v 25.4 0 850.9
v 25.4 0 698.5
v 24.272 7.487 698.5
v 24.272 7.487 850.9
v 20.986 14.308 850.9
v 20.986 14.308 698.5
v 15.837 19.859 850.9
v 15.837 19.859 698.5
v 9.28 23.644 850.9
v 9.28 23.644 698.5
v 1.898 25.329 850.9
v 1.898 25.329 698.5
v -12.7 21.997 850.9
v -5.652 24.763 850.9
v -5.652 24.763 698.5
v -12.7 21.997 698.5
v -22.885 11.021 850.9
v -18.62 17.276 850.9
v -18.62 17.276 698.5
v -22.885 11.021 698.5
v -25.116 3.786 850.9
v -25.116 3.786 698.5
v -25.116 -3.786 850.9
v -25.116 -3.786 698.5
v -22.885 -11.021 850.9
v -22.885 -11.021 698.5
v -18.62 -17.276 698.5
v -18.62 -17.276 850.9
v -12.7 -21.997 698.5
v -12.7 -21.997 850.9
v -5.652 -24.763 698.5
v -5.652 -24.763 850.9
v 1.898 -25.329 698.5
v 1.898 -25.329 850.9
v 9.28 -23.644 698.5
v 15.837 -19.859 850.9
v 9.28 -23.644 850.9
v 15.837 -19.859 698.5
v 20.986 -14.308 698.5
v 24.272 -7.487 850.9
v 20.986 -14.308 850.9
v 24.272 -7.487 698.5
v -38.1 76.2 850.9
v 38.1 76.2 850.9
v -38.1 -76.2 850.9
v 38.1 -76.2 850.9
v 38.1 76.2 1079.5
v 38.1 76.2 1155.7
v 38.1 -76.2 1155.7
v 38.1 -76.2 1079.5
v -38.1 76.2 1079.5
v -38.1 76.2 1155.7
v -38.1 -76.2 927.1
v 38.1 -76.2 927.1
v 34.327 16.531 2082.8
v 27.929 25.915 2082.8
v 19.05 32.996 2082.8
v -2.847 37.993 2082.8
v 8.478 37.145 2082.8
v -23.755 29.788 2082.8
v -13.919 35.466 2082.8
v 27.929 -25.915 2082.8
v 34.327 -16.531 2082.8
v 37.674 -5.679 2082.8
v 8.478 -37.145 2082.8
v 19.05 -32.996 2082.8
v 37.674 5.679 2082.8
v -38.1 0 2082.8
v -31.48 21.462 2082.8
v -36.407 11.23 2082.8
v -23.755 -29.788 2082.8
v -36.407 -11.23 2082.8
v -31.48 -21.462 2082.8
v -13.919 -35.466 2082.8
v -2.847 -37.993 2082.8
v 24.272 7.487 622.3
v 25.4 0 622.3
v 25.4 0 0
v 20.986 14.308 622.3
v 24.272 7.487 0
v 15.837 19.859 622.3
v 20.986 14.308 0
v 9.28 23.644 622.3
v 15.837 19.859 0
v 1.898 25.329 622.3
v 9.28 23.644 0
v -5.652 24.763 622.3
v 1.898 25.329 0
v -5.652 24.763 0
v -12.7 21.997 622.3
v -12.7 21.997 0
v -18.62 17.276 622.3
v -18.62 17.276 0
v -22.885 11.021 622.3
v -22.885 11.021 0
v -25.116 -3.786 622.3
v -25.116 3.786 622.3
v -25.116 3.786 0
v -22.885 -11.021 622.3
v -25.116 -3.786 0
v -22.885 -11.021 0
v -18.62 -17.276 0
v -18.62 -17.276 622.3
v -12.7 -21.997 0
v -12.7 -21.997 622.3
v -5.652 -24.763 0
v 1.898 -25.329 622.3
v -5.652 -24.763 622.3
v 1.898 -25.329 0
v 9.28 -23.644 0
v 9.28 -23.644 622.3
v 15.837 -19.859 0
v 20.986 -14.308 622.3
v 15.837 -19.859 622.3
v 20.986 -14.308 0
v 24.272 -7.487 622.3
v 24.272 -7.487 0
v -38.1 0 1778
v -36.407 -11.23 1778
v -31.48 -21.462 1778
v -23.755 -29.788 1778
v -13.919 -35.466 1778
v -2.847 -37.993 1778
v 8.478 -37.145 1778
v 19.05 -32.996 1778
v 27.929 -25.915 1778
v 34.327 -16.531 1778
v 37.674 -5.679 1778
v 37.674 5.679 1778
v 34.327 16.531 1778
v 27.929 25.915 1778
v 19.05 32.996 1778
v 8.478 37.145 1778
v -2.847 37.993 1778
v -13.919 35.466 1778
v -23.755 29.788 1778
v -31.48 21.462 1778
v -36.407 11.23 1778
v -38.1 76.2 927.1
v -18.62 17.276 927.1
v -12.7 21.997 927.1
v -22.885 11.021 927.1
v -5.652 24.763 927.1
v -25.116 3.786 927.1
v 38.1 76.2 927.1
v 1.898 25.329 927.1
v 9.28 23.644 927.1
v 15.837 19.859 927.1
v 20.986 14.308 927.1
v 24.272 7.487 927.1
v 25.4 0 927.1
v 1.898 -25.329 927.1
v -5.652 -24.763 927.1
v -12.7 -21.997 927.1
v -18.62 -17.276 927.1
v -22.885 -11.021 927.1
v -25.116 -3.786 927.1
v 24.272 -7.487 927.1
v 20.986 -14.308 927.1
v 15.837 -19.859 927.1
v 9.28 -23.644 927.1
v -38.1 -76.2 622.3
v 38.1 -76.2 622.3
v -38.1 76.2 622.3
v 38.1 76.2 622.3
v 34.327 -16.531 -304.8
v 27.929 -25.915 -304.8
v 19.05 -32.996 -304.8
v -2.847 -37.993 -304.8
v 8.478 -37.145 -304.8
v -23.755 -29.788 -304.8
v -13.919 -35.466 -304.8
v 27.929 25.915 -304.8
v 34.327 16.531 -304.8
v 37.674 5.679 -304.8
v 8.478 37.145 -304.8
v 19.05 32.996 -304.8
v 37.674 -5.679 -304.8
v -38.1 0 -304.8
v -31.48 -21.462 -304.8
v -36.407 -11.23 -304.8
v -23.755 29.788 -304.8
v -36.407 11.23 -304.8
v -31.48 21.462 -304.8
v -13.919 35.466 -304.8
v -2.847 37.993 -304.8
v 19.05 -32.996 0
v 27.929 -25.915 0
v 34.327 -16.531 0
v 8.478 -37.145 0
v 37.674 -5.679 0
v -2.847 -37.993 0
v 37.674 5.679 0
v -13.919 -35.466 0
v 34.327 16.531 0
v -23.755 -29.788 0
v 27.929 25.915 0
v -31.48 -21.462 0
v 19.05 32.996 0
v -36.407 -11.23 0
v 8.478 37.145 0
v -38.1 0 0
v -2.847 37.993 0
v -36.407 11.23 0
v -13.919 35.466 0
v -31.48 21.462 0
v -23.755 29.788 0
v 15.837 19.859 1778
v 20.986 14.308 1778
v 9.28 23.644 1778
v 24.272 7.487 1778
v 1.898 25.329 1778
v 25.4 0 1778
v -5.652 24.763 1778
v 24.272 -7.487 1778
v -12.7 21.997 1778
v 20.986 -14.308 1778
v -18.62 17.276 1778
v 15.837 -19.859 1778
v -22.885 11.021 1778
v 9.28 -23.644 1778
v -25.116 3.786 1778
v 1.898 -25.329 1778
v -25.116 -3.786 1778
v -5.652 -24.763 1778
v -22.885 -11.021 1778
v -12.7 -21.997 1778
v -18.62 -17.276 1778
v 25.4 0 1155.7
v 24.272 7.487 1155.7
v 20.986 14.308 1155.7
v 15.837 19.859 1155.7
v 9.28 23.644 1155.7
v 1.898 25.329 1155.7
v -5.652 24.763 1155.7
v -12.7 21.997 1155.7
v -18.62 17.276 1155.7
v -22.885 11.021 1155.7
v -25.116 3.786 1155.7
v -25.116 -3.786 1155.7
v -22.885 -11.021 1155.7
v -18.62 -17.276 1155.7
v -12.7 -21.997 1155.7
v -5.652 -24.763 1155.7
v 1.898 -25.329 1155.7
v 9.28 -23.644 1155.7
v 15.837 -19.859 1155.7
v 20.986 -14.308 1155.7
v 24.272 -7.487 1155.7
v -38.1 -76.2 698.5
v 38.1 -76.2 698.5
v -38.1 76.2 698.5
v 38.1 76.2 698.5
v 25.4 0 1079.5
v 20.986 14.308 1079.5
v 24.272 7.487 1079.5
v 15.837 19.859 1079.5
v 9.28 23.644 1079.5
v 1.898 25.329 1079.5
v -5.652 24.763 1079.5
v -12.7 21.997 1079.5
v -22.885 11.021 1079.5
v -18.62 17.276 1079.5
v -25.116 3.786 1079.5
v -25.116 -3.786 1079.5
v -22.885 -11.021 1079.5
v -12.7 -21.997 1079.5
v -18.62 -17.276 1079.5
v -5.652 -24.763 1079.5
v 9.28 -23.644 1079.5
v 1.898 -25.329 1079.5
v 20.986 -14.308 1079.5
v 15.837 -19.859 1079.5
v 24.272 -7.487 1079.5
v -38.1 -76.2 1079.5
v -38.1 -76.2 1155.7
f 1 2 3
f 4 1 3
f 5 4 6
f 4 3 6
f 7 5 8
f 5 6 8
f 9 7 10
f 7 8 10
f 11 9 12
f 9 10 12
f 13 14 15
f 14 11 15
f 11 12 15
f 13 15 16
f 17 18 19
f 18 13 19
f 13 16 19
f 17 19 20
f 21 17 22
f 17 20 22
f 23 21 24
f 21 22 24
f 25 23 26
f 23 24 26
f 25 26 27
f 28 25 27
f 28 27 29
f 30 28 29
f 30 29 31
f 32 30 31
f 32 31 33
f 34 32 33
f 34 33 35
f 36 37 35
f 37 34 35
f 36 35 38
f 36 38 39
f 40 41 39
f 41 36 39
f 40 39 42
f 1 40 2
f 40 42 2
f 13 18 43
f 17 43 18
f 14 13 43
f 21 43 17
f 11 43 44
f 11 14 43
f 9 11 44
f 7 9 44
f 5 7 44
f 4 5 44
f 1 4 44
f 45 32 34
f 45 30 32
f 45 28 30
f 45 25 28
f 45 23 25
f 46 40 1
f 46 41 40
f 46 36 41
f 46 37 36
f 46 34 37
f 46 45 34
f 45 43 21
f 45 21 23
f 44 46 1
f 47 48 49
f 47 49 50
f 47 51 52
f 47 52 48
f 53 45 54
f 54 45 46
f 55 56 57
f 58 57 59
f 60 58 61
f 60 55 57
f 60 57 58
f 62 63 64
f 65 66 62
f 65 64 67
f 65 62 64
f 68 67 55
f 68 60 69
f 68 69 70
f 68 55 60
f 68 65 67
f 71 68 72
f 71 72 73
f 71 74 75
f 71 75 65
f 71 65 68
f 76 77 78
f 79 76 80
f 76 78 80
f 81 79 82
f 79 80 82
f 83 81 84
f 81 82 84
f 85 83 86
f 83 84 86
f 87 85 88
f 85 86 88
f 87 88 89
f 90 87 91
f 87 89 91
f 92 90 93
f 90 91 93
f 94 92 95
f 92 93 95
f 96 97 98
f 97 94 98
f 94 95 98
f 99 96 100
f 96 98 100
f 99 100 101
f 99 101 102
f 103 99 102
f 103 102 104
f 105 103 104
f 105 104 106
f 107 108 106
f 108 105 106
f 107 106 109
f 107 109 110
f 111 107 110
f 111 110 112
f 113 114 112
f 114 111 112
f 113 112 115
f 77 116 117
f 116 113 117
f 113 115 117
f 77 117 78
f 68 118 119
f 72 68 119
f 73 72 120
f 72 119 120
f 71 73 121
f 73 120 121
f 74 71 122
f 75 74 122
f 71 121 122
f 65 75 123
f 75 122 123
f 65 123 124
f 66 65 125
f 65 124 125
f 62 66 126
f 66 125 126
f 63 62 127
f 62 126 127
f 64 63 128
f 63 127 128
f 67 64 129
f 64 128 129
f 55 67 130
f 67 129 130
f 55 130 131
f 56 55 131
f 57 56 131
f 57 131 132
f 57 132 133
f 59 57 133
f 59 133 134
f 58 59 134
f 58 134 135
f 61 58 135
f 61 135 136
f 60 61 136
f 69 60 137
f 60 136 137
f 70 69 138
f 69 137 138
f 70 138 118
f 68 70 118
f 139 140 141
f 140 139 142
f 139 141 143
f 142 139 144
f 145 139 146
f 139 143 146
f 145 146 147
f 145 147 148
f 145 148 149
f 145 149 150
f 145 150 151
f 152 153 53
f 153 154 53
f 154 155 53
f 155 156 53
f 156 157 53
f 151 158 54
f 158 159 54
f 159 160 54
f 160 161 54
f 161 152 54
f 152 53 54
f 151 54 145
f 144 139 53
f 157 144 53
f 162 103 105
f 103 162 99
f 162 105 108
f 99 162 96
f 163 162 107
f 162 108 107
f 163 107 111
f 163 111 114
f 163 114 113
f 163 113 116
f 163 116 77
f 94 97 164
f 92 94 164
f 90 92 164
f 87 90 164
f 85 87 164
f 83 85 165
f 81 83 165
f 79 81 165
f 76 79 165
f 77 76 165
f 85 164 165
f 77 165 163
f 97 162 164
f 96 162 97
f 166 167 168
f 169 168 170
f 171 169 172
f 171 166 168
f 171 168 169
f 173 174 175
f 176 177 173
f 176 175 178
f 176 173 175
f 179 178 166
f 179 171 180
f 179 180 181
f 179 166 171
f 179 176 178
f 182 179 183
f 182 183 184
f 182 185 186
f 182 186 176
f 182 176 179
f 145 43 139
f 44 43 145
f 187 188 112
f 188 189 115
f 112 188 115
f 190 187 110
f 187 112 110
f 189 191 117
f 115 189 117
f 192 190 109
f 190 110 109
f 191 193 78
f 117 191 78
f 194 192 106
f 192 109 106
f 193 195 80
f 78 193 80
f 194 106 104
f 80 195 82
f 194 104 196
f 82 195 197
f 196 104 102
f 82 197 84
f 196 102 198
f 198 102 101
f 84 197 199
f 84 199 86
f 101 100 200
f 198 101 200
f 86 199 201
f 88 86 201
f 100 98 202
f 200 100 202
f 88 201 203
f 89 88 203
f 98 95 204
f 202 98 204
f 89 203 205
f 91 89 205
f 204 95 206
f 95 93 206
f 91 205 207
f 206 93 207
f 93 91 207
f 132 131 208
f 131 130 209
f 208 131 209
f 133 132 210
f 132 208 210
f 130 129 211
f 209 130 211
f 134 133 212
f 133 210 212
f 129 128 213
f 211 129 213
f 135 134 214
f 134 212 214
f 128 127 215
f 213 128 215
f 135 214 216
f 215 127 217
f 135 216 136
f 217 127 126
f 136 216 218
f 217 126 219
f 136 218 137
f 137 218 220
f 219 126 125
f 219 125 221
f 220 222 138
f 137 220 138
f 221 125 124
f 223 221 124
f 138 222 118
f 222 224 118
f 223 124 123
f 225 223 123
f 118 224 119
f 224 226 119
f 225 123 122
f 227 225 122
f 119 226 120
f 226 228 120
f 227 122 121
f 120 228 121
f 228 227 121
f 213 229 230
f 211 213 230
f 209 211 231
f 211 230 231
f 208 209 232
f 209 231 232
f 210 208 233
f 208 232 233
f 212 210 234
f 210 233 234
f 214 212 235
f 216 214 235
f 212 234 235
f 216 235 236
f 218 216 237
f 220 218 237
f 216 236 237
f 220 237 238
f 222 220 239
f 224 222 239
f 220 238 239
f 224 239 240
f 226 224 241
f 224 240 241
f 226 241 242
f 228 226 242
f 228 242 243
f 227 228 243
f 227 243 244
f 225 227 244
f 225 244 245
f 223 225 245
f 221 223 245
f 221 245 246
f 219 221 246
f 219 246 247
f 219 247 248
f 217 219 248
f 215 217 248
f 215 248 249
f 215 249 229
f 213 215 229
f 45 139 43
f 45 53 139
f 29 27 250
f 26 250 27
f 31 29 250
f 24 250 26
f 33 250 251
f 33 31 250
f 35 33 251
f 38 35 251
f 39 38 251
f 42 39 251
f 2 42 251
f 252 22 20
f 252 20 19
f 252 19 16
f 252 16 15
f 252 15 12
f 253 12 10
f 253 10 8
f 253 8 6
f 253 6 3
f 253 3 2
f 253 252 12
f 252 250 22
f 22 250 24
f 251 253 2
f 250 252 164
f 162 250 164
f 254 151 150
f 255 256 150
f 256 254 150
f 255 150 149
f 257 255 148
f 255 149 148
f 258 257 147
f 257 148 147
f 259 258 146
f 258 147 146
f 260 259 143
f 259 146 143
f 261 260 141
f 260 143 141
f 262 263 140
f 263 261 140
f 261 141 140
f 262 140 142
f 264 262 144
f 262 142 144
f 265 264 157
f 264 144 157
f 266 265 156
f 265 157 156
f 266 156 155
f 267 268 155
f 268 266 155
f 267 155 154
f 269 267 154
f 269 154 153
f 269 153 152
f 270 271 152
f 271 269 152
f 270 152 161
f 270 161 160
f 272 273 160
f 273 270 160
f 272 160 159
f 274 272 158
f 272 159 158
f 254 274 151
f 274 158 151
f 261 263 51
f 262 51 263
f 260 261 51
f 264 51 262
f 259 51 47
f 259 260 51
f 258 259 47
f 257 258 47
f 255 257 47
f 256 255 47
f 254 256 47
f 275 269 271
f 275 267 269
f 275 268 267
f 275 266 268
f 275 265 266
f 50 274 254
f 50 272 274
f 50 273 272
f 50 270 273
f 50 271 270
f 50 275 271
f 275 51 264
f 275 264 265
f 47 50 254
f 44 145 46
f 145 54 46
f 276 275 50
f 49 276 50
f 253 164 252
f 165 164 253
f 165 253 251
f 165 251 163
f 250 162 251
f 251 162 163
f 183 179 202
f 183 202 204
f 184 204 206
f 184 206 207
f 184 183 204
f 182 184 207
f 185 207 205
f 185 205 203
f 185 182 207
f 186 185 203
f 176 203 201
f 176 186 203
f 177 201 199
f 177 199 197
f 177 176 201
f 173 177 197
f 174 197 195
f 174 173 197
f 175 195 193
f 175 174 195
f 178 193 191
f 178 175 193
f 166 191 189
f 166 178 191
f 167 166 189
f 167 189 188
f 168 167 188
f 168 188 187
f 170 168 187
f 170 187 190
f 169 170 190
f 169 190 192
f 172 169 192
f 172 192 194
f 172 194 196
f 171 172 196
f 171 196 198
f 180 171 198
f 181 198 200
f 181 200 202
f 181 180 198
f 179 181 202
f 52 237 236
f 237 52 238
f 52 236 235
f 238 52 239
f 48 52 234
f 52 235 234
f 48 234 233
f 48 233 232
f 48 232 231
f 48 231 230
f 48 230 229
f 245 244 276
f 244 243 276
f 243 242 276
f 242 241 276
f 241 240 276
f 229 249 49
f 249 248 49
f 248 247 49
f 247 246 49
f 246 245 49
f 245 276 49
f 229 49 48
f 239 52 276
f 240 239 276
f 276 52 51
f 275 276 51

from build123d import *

# Parameters (mm, degrees)
SKETCH1_R           = 25.4
BOSS_EXTRUDE1_DEPTH = 1778
SKETCH2_R           = 38.1
BOSS_EXTRUDE2_DEPTH = 304.8
BOSS_EXTRUDE3_START = 304.8
SKETCH3_R           = 38.1
BOSS_EXTRUDE3_DEPTH = 304.8
SKETCH4_W           = 76.2
SKETCH4_H           = 76.2
BOSS_EXTRUDE4_DEPTH = 76.2


with BuildPart() as part:
    # Sketch1 → Boss-Extrude1 (new body)
    with BuildSketch(Plane.XY):
        Circle(SKETCH1_R)
    extrude(amount=BOSS_EXTRUDE1_DEPTH)

    # Sketch2 → Boss-Extrude2 (add)
    with BuildSketch(Plane.XY.offset(1778)):
        with Locations(Location((0, 0, 0), (0, 0, 180))):
            Circle(SKETCH2_R)
    extrude(amount=BOSS_EXTRUDE2_DEPTH)

    # Sketch3 → Boss-Extrude3 (add)
    with BuildSketch(Plane(origin=(0, 0, 0), x_dir=(-1, 0, 0), z_dir=(0, 0, -1)).offset(BOSS_EXTRUDE3_START)):
        Circle(SKETCH3_R)
    extrude(amount=-BOSS_EXTRUDE3_DEPTH)

    # Sketch4 → Boss-Extrude4 (add, symmetric)
    with BuildSketch(Plane(origin=(0, 0, 0), x_dir=(1, 0, 0), z_dir=(0, 1, 0))):
        with Locations((0, -889)):
            Rectangle(SKETCH4_W, SKETCH4_H)
        with Locations((0, -1117.6)):
            Rectangle(SKETCH4_W, SKETCH4_H)
        with Locations((0, -660.4)):
            Rectangle(SKETCH4_W, SKETCH4_H)
    extrude(amount=BOSS_EXTRUDE4_DEPTH, both=True)


solid = part.part
